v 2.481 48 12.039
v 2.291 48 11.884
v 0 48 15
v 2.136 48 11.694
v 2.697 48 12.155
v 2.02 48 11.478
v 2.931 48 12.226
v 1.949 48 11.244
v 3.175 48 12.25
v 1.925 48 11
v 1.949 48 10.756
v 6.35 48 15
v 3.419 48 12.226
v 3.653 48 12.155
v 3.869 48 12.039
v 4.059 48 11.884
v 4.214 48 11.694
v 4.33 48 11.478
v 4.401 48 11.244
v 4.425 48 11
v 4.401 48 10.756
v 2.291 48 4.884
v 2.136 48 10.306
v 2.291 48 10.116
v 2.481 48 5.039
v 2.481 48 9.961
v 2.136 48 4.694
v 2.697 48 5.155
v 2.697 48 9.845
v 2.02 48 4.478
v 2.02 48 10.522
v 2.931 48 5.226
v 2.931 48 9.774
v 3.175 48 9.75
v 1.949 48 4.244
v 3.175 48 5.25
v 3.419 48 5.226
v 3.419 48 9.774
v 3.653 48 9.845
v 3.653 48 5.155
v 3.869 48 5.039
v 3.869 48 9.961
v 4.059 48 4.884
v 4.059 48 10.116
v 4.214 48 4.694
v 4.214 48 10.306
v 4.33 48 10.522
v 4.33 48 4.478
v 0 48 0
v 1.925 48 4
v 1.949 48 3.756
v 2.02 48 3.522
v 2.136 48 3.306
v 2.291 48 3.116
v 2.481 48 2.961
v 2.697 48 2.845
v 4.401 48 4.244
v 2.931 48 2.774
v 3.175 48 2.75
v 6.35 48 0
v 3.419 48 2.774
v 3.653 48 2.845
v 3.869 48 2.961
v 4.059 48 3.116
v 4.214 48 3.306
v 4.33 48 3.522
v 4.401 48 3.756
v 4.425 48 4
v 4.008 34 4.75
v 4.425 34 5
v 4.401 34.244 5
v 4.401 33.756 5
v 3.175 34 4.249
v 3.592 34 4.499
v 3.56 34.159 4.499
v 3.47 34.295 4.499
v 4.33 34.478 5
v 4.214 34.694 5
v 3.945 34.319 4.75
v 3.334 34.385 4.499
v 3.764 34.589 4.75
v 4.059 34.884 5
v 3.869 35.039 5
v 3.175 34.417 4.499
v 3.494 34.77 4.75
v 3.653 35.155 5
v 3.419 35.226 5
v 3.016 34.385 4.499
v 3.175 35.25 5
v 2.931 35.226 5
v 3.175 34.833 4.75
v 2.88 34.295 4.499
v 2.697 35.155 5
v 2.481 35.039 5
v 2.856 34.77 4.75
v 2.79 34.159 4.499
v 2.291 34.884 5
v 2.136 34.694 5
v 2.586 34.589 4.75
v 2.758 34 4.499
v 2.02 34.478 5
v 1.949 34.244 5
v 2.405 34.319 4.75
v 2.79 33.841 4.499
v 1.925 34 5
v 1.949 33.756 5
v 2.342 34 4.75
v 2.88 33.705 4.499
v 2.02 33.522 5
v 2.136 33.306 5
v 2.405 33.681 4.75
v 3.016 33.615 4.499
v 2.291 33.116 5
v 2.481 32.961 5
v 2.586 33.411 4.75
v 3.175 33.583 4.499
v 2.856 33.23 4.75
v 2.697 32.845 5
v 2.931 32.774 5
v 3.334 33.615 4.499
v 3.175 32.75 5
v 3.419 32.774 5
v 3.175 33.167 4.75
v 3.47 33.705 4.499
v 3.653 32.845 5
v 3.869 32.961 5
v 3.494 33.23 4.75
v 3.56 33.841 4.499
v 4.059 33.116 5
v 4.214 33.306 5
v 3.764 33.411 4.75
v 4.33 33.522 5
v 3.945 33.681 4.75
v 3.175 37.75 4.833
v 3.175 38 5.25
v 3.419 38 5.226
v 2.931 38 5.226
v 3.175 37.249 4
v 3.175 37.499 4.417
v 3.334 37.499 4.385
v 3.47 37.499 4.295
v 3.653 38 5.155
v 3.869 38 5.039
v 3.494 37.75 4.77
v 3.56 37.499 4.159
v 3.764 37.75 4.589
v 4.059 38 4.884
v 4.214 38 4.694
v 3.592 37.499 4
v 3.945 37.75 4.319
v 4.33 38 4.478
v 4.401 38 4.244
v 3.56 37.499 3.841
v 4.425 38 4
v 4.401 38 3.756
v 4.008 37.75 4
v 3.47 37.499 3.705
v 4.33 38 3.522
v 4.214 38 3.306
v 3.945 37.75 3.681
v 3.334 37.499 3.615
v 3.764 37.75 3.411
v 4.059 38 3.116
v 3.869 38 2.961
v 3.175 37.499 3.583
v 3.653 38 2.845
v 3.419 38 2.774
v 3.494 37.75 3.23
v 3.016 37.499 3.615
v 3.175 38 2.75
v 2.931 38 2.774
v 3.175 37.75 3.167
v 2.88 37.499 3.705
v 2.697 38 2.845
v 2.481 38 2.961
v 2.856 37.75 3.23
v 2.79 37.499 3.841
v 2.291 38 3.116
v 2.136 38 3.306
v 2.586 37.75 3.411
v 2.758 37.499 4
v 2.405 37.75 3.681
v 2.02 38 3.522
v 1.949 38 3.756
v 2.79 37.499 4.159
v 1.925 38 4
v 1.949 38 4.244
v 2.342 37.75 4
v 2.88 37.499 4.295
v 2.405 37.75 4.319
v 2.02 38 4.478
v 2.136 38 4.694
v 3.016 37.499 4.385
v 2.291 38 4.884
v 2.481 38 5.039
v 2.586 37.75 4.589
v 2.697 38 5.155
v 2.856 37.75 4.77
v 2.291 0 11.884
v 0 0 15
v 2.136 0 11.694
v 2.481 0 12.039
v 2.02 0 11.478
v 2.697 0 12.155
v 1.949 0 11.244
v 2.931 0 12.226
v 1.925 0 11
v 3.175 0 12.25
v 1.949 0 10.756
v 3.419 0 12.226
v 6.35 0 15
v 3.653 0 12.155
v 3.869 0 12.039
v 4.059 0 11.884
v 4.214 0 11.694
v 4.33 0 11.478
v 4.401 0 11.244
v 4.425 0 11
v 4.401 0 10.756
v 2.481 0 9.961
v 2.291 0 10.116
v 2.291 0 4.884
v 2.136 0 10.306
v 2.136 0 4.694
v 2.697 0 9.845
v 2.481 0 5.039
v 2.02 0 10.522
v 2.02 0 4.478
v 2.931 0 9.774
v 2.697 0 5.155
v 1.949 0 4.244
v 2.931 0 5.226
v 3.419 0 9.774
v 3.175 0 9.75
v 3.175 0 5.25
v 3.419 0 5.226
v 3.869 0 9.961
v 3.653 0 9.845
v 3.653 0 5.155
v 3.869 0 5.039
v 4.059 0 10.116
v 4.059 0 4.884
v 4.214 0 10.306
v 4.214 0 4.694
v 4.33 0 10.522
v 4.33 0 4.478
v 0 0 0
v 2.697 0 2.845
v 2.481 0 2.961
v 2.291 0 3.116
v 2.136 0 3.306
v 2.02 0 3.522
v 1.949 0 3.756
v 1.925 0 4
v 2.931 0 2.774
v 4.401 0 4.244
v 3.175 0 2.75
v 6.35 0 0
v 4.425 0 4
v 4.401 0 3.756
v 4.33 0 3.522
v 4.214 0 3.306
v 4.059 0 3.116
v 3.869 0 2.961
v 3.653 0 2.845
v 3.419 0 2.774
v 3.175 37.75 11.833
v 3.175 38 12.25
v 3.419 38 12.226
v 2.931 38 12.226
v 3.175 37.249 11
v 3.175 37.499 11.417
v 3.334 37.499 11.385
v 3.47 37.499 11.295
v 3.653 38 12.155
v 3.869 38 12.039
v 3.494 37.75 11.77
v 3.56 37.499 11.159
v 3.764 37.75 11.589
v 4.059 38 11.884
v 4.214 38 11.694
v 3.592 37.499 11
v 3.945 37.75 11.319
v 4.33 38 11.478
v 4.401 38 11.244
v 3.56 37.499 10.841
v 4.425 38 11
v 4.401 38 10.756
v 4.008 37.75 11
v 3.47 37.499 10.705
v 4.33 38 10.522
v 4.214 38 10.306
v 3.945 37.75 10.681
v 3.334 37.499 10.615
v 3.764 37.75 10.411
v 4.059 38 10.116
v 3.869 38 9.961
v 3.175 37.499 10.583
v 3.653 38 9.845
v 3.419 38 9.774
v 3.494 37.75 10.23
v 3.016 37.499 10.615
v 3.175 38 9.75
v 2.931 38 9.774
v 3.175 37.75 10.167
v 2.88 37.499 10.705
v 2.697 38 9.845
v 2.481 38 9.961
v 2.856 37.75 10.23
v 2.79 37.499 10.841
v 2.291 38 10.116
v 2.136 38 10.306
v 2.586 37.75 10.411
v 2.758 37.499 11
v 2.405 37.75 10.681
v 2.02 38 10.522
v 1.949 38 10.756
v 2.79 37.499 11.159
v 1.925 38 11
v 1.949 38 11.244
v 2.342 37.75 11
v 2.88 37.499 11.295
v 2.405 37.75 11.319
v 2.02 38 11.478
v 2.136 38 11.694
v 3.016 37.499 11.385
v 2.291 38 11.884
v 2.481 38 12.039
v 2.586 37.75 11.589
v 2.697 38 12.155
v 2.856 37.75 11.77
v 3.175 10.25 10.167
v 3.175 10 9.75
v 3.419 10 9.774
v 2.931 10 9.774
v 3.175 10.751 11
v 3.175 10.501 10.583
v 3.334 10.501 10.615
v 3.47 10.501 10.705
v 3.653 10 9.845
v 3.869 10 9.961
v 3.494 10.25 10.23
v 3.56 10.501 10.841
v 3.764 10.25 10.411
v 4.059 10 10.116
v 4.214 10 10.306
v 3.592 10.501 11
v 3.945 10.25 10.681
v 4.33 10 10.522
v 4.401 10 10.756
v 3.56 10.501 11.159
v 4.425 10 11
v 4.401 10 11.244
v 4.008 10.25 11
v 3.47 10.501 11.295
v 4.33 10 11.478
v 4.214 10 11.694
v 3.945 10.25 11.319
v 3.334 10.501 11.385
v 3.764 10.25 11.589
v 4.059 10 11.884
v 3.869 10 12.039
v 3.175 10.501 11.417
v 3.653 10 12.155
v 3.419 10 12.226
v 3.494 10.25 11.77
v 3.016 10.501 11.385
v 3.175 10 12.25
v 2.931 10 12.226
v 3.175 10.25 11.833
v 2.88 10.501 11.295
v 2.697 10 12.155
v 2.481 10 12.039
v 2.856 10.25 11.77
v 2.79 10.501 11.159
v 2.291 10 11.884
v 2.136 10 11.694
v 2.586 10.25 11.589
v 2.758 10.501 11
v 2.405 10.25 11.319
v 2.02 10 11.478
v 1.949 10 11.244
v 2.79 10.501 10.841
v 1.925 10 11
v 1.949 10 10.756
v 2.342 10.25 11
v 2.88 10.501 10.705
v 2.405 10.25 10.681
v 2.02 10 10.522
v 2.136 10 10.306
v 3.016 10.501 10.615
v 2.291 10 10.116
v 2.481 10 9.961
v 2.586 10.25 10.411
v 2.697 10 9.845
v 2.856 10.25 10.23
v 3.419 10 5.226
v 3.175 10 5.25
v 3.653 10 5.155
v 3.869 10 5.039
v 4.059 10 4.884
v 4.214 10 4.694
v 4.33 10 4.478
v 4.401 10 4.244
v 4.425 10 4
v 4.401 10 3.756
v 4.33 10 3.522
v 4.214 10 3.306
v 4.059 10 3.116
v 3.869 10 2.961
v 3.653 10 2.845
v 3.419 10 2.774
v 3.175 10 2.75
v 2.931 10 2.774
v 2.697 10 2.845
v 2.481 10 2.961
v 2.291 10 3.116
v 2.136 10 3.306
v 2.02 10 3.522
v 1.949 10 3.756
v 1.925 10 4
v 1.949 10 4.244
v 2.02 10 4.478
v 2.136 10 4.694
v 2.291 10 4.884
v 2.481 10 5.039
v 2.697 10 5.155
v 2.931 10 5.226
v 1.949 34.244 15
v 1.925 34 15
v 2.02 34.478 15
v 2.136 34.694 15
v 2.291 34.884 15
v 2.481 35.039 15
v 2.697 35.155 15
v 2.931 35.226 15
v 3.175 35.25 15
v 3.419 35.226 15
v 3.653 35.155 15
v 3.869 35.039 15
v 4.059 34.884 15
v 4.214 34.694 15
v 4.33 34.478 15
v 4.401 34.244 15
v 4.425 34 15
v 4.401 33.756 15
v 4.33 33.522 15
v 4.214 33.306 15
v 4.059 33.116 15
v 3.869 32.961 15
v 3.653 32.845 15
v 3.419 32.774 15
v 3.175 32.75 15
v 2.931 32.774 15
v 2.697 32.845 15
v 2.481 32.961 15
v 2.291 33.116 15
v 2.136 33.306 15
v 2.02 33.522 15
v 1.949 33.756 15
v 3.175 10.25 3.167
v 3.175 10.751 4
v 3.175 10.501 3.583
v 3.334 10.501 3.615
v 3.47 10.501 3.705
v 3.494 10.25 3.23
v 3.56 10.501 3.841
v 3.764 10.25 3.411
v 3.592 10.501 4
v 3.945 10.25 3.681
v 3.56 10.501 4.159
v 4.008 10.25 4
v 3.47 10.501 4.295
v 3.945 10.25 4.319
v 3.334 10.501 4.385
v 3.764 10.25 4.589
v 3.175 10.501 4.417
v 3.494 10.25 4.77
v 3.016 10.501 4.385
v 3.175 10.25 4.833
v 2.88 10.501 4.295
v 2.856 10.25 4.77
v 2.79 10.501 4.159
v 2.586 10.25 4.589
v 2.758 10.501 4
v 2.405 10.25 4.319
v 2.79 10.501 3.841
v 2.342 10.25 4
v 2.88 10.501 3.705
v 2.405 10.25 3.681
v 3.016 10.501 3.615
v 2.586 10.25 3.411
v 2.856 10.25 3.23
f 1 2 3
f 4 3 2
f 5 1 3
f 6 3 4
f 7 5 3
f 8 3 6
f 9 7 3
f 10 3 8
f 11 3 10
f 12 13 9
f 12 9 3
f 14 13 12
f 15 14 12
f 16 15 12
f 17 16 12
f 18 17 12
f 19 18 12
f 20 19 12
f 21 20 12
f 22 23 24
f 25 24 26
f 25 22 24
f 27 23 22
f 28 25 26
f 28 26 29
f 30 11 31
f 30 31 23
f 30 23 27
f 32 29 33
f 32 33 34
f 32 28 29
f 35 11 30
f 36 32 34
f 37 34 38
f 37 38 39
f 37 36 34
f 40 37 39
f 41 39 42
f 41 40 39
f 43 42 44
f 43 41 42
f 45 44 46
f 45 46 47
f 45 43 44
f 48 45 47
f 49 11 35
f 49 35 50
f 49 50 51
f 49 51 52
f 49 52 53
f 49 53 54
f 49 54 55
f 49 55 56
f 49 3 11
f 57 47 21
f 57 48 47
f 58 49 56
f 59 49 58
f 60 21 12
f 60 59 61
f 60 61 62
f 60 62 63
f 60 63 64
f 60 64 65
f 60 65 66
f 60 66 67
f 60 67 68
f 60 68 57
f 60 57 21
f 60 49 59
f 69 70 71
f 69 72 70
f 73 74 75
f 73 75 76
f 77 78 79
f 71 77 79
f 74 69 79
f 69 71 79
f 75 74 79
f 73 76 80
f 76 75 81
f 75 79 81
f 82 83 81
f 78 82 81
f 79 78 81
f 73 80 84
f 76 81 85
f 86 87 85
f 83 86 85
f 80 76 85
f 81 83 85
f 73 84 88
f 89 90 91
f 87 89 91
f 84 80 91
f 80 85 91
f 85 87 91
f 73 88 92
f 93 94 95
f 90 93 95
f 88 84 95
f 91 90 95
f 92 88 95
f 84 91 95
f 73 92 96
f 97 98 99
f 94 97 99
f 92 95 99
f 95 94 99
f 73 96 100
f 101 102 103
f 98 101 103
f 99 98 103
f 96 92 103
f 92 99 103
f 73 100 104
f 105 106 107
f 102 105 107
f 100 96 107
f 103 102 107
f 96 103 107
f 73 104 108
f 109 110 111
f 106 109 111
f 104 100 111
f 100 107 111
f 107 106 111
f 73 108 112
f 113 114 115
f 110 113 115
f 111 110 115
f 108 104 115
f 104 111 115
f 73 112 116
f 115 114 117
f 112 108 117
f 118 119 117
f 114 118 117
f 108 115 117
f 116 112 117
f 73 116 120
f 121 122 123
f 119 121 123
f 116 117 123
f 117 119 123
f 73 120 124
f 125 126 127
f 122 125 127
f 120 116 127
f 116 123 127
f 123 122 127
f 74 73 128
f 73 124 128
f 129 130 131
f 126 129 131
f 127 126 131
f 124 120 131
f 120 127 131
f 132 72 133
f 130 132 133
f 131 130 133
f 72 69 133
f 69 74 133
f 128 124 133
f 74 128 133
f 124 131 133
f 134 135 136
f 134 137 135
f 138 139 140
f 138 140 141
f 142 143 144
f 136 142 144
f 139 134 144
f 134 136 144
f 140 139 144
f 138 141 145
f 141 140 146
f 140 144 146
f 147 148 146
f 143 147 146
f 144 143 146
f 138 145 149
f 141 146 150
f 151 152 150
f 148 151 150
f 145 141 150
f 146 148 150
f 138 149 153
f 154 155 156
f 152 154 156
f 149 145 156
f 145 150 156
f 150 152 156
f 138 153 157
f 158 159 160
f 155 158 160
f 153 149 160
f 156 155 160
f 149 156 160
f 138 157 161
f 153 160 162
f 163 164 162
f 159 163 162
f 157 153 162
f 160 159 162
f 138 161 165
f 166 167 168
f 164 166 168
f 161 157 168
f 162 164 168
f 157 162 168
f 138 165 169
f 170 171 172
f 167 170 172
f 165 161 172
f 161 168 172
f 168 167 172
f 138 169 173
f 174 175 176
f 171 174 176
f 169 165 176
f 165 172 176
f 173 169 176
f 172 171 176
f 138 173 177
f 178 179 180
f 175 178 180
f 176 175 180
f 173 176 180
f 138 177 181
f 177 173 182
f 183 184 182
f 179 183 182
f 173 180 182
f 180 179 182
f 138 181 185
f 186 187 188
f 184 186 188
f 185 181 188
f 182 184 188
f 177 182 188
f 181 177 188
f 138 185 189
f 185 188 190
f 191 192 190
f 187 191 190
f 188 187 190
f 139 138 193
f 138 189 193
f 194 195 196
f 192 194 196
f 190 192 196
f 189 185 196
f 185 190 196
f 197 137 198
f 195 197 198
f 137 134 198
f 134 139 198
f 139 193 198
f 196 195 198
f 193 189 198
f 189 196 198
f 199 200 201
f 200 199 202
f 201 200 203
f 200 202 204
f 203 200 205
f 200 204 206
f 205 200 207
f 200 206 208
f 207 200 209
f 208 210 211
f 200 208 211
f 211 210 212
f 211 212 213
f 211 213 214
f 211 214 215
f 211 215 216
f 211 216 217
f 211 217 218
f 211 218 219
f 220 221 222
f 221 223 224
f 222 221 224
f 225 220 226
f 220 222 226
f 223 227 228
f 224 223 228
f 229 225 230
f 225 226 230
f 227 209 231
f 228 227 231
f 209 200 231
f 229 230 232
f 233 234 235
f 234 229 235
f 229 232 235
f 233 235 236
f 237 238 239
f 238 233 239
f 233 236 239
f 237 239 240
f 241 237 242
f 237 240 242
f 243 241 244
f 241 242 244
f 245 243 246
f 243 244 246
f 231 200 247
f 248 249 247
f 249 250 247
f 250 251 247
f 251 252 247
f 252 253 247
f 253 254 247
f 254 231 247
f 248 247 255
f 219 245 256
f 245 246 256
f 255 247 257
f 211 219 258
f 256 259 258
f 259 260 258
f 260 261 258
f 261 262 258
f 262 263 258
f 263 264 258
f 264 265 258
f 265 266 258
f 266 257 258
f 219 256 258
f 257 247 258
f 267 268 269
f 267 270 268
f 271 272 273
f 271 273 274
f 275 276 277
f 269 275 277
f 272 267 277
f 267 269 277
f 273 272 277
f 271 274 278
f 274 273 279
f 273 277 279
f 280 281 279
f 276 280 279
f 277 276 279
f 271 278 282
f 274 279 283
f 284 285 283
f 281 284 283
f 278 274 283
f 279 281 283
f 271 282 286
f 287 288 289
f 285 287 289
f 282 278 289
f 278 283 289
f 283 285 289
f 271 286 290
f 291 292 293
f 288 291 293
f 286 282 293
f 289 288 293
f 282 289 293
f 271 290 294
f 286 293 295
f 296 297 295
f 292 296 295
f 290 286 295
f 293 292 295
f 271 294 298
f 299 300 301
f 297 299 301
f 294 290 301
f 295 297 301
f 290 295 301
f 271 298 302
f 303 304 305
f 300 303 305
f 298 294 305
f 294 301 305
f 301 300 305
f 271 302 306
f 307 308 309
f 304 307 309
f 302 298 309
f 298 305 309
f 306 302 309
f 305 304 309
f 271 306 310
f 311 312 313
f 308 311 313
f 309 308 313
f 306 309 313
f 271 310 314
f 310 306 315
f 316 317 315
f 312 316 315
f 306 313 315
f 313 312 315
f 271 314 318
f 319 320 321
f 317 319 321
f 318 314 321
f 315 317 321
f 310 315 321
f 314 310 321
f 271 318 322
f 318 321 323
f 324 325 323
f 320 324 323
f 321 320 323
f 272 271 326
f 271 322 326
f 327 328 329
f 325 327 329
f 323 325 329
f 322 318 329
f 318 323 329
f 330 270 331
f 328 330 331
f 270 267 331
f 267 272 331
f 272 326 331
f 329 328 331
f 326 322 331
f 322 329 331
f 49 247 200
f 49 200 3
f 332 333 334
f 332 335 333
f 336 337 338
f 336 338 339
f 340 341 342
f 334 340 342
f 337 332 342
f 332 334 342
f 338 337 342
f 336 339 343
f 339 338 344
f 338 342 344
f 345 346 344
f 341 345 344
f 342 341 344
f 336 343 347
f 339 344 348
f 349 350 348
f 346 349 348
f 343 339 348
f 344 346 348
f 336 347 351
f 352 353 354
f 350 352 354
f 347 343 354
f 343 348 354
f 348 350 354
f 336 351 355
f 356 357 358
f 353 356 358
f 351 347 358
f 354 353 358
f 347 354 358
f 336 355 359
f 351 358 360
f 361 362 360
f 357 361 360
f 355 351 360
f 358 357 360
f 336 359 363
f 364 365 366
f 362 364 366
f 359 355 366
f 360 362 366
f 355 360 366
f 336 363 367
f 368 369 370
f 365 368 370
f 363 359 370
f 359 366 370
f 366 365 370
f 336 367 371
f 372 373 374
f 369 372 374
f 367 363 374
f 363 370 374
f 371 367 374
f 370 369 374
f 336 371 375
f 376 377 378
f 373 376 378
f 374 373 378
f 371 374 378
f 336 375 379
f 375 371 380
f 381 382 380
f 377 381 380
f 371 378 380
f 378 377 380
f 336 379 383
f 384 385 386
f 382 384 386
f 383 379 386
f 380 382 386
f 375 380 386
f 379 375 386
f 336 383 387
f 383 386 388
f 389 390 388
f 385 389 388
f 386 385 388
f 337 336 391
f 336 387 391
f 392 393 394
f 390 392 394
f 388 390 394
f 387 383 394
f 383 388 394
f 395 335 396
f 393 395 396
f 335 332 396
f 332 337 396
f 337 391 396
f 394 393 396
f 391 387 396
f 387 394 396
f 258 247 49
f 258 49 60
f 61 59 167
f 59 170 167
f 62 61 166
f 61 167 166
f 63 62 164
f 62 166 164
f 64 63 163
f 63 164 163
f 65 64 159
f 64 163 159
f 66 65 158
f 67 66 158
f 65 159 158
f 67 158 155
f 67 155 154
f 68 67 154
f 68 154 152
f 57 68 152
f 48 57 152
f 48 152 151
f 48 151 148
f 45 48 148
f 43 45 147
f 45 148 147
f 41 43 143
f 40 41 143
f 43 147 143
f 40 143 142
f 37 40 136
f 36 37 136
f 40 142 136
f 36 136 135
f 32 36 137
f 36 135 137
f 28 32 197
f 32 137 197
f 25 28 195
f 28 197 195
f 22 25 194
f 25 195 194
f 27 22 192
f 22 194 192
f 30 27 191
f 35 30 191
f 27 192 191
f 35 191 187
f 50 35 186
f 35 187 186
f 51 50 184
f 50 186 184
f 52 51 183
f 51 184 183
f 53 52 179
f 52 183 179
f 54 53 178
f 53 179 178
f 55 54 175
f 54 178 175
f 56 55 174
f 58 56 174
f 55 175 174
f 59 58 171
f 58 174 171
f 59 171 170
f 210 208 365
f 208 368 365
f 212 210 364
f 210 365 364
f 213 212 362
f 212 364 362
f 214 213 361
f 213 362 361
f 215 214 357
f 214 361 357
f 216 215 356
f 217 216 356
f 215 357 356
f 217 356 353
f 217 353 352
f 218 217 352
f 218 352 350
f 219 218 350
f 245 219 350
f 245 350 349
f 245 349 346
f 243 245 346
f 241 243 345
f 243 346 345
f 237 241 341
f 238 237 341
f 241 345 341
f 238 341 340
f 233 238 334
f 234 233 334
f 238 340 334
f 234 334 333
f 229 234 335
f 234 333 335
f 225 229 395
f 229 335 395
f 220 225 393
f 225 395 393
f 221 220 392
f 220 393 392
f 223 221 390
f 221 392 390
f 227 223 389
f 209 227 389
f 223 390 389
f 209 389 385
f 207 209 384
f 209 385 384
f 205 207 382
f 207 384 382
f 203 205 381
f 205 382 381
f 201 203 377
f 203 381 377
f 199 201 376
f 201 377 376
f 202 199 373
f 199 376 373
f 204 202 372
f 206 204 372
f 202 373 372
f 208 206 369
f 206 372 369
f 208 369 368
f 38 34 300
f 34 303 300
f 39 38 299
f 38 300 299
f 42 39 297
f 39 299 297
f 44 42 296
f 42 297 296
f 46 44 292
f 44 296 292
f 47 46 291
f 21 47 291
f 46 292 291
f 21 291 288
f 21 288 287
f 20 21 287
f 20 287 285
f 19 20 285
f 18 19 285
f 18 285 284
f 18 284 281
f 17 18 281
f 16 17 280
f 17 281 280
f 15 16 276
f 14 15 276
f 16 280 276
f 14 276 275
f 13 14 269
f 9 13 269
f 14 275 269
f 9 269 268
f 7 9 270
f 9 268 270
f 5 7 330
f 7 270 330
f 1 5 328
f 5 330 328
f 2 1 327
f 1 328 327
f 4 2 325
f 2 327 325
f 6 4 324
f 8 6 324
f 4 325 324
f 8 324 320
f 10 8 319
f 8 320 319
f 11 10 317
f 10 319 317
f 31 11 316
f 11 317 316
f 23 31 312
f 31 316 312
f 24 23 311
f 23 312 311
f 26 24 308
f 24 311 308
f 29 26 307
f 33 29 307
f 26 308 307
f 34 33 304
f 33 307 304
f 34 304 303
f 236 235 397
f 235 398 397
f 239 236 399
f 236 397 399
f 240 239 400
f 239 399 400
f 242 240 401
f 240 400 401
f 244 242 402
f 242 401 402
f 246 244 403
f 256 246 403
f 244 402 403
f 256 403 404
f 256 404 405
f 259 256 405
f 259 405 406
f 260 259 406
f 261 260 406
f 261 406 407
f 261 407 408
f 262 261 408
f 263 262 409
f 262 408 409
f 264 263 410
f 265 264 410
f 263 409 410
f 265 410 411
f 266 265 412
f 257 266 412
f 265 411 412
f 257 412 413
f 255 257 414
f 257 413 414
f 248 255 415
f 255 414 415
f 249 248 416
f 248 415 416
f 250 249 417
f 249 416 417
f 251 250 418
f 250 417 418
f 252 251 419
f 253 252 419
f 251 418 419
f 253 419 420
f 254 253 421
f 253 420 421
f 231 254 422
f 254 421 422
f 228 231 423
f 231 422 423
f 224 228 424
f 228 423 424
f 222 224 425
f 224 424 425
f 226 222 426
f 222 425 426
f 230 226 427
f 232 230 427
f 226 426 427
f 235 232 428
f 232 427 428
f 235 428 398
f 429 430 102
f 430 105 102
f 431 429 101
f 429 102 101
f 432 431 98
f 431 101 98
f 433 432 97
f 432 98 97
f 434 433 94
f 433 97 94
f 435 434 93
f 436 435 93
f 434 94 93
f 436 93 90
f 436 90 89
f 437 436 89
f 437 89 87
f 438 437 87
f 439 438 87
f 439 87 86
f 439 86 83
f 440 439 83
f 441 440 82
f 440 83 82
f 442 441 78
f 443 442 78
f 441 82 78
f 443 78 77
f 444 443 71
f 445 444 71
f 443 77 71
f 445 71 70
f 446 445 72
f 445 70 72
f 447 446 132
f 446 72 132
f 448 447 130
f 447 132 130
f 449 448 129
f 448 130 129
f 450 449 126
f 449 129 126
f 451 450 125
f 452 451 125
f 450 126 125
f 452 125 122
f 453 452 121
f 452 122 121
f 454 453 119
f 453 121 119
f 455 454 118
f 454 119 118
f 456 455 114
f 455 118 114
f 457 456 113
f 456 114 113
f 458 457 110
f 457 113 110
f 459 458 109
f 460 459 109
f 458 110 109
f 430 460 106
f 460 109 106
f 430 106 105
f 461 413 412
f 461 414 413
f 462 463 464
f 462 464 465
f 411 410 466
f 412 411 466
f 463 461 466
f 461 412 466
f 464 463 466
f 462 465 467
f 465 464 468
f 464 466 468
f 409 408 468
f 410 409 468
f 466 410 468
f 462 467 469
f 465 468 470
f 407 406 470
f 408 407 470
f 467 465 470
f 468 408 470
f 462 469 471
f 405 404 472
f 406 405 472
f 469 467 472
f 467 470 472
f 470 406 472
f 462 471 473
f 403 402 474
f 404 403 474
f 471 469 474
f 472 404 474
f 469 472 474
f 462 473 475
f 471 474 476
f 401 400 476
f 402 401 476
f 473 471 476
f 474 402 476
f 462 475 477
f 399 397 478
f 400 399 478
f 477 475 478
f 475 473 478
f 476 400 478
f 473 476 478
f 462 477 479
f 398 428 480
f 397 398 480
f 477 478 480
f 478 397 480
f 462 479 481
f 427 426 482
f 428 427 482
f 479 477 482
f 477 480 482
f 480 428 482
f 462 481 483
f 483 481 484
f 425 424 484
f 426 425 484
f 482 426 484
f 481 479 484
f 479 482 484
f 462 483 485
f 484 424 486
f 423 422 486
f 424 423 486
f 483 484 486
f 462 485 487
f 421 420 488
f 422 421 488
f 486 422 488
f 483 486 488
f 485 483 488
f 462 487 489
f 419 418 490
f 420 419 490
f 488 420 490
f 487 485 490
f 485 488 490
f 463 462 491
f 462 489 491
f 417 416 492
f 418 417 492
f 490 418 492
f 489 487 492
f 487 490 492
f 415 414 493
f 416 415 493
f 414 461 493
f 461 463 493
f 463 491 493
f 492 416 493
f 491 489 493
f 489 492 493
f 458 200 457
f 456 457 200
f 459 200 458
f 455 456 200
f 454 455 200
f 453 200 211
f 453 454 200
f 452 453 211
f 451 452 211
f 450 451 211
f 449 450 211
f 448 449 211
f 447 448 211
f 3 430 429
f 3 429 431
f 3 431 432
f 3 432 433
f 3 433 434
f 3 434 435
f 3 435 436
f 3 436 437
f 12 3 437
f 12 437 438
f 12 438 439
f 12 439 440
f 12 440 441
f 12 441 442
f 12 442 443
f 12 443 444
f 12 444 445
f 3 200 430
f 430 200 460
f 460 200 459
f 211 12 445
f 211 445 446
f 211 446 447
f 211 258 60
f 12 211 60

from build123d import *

# Parameters (mm, degrees)
ESBO_O1_W                 = 6.35
ESBO_O1_H                 = 48
RESSALTO_EXTRUS_O1_DEPTH  = 15
FURO_ROSCADO_DE_M31_D     = 2.5
FURO_ROSCADO_DE_M31_DEPTH = 10
FURO_ROSCADO_DE_M31_TIP   = 0.751075774
FURO_ROSCADO_DE_M32_D     = 2.5
FURO_ROSCADO_DE_M32_DEPTH = 10
FURO_ROSCADO_DE_M32_TIP   = 0.751075774
FURO_ROSCADO_DE_M33_D     = 2.5
FURO_ROSCADO_DE_M33_DEPTH = 10
FURO_ROSCADO_DE_M33_TIP   = 0.751075774


with BuildPart() as part:
    # Esboço1 → Ressalto-extrusão1 (new body)
    with BuildSketch(Plane.XY):
        with Locations((3.175, 24)):
            Rectangle(ESBO_O1_W, ESBO_O1_H)
    extrude(amount=RESSALTO_EXTRUS_O1_DEPTH)

    # Furo roscado de M31
    with Locations(Plane(origin=(3.175, 0, 11), x_dir=(0, 0, -1), z_dir=(0, -1, 0))):
        with Locations((0, 0), (7, 0)):
            Hole(FURO_ROSCADO_DE_M31_D / 2, depth=FURO_ROSCADO_DE_M31_DEPTH)
            with Locations((0, 0, -(FURO_ROSCADO_DE_M31_DEPTH + FURO_ROSCADO_DE_M31_TIP / 2))):  # 118° drill point
                Cone(0, FURO_ROSCADO_DE_M31_D / 2, FURO_ROSCADO_DE_M31_TIP, mode=Mode.SUBTRACT)

    # Furo roscado de M32
    with Locations(Plane(origin=(3.175, 48, 4), x_dir=(0, 0, 1), z_dir=(0, 1, 0))):
        with Locations((0, 0), (7, 0)):
            Hole(FURO_ROSCADO_DE_M32_D / 2, depth=FURO_ROSCADO_DE_M32_DEPTH)
            with Locations((0, 0, -(FURO_ROSCADO_DE_M32_DEPTH + FURO_ROSCADO_DE_M32_TIP / 2))):  # 118° drill point
                Cone(0, FURO_ROSCADO_DE_M32_D / 2, FURO_ROSCADO_DE_M32_TIP, mode=Mode.SUBTRACT)

    # Furo roscado de M33
    with Locations(Plane(origin=(3.175, 34, 15), x_dir=(1, 0, 0), z_dir=(0, 0, 1))):
        with Locations((0, 0)):
            Hole(FURO_ROSCADO_DE_M33_D / 2, depth=FURO_ROSCADO_DE_M33_DEPTH)
            with Locations((0, 0, -(FURO_ROSCADO_DE_M33_DEPTH + FURO_ROSCADO_DE_M33_TIP / 2))):  # 118° drill point
                Cone(0, FURO_ROSCADO_DE_M33_D / 2, FURO_ROSCADO_DE_M33_TIP, mode=Mode.SUBTRACT)


solid = part.part
